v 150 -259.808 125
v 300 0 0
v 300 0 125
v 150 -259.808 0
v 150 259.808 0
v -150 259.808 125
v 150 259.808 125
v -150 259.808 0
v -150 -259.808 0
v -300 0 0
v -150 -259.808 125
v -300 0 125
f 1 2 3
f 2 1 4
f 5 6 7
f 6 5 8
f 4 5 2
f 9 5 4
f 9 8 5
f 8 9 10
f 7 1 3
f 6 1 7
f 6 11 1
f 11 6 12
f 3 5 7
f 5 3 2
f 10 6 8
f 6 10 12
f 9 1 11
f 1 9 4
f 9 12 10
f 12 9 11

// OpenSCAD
// resolution bezier curve
deltat = 0.003;

// cubic bexier curve function
function cubic_bezier(p0,p1,p2,p3) = [for (t=[0:deltat:1+deltat]) pow(1-t,3)*p0+3*pow((1-t),2)*t*p1+3*(1-t)*pow(t,2)*p2+pow(t,3)*p3];
    
function reverse(v) = [for (i=[len(v)-1:-1:0]) v[i]];
function delete_first(v) = [for (i=[1:len(v)-1]) v[i]]; 

// cubic bezier curve for canal shape 
// +1 for a clean boolean operation
p10 = [-150, 125+1];
p11 = [-60, 125+1];
p12 = [-120, 35];
p13 = [0, 35];

p20 = [150, 125+1];
p21 = [60, 125+1];
p22 = [120, 35];
p23 = [0, 35];

// bezier curve
points_left = cubic_bezier(p10, p11, p12, p13);
points_right = reverse(cubic_bezier(p20, p21, p22, p23));
points = concat(points_left, points_right);


difference()
{
    
    // hexagon base
    color("Peru", 1.0)
    {
        linear_extrude(height = 125, center = false, convexity = 10, twist = 0)
        circle(300, $fn=6);
    }
    
    color("DodgerBlue", 1.0)
    {
        tx=450;
        ty=259.8;
        // canal shape
        translate([-tx, -ty, 0])
        rotate_extrude(angle=360, convexity=10, $fn=90)
        translate([-tx, 0, -ty])
        polygon(points);
    }
}
